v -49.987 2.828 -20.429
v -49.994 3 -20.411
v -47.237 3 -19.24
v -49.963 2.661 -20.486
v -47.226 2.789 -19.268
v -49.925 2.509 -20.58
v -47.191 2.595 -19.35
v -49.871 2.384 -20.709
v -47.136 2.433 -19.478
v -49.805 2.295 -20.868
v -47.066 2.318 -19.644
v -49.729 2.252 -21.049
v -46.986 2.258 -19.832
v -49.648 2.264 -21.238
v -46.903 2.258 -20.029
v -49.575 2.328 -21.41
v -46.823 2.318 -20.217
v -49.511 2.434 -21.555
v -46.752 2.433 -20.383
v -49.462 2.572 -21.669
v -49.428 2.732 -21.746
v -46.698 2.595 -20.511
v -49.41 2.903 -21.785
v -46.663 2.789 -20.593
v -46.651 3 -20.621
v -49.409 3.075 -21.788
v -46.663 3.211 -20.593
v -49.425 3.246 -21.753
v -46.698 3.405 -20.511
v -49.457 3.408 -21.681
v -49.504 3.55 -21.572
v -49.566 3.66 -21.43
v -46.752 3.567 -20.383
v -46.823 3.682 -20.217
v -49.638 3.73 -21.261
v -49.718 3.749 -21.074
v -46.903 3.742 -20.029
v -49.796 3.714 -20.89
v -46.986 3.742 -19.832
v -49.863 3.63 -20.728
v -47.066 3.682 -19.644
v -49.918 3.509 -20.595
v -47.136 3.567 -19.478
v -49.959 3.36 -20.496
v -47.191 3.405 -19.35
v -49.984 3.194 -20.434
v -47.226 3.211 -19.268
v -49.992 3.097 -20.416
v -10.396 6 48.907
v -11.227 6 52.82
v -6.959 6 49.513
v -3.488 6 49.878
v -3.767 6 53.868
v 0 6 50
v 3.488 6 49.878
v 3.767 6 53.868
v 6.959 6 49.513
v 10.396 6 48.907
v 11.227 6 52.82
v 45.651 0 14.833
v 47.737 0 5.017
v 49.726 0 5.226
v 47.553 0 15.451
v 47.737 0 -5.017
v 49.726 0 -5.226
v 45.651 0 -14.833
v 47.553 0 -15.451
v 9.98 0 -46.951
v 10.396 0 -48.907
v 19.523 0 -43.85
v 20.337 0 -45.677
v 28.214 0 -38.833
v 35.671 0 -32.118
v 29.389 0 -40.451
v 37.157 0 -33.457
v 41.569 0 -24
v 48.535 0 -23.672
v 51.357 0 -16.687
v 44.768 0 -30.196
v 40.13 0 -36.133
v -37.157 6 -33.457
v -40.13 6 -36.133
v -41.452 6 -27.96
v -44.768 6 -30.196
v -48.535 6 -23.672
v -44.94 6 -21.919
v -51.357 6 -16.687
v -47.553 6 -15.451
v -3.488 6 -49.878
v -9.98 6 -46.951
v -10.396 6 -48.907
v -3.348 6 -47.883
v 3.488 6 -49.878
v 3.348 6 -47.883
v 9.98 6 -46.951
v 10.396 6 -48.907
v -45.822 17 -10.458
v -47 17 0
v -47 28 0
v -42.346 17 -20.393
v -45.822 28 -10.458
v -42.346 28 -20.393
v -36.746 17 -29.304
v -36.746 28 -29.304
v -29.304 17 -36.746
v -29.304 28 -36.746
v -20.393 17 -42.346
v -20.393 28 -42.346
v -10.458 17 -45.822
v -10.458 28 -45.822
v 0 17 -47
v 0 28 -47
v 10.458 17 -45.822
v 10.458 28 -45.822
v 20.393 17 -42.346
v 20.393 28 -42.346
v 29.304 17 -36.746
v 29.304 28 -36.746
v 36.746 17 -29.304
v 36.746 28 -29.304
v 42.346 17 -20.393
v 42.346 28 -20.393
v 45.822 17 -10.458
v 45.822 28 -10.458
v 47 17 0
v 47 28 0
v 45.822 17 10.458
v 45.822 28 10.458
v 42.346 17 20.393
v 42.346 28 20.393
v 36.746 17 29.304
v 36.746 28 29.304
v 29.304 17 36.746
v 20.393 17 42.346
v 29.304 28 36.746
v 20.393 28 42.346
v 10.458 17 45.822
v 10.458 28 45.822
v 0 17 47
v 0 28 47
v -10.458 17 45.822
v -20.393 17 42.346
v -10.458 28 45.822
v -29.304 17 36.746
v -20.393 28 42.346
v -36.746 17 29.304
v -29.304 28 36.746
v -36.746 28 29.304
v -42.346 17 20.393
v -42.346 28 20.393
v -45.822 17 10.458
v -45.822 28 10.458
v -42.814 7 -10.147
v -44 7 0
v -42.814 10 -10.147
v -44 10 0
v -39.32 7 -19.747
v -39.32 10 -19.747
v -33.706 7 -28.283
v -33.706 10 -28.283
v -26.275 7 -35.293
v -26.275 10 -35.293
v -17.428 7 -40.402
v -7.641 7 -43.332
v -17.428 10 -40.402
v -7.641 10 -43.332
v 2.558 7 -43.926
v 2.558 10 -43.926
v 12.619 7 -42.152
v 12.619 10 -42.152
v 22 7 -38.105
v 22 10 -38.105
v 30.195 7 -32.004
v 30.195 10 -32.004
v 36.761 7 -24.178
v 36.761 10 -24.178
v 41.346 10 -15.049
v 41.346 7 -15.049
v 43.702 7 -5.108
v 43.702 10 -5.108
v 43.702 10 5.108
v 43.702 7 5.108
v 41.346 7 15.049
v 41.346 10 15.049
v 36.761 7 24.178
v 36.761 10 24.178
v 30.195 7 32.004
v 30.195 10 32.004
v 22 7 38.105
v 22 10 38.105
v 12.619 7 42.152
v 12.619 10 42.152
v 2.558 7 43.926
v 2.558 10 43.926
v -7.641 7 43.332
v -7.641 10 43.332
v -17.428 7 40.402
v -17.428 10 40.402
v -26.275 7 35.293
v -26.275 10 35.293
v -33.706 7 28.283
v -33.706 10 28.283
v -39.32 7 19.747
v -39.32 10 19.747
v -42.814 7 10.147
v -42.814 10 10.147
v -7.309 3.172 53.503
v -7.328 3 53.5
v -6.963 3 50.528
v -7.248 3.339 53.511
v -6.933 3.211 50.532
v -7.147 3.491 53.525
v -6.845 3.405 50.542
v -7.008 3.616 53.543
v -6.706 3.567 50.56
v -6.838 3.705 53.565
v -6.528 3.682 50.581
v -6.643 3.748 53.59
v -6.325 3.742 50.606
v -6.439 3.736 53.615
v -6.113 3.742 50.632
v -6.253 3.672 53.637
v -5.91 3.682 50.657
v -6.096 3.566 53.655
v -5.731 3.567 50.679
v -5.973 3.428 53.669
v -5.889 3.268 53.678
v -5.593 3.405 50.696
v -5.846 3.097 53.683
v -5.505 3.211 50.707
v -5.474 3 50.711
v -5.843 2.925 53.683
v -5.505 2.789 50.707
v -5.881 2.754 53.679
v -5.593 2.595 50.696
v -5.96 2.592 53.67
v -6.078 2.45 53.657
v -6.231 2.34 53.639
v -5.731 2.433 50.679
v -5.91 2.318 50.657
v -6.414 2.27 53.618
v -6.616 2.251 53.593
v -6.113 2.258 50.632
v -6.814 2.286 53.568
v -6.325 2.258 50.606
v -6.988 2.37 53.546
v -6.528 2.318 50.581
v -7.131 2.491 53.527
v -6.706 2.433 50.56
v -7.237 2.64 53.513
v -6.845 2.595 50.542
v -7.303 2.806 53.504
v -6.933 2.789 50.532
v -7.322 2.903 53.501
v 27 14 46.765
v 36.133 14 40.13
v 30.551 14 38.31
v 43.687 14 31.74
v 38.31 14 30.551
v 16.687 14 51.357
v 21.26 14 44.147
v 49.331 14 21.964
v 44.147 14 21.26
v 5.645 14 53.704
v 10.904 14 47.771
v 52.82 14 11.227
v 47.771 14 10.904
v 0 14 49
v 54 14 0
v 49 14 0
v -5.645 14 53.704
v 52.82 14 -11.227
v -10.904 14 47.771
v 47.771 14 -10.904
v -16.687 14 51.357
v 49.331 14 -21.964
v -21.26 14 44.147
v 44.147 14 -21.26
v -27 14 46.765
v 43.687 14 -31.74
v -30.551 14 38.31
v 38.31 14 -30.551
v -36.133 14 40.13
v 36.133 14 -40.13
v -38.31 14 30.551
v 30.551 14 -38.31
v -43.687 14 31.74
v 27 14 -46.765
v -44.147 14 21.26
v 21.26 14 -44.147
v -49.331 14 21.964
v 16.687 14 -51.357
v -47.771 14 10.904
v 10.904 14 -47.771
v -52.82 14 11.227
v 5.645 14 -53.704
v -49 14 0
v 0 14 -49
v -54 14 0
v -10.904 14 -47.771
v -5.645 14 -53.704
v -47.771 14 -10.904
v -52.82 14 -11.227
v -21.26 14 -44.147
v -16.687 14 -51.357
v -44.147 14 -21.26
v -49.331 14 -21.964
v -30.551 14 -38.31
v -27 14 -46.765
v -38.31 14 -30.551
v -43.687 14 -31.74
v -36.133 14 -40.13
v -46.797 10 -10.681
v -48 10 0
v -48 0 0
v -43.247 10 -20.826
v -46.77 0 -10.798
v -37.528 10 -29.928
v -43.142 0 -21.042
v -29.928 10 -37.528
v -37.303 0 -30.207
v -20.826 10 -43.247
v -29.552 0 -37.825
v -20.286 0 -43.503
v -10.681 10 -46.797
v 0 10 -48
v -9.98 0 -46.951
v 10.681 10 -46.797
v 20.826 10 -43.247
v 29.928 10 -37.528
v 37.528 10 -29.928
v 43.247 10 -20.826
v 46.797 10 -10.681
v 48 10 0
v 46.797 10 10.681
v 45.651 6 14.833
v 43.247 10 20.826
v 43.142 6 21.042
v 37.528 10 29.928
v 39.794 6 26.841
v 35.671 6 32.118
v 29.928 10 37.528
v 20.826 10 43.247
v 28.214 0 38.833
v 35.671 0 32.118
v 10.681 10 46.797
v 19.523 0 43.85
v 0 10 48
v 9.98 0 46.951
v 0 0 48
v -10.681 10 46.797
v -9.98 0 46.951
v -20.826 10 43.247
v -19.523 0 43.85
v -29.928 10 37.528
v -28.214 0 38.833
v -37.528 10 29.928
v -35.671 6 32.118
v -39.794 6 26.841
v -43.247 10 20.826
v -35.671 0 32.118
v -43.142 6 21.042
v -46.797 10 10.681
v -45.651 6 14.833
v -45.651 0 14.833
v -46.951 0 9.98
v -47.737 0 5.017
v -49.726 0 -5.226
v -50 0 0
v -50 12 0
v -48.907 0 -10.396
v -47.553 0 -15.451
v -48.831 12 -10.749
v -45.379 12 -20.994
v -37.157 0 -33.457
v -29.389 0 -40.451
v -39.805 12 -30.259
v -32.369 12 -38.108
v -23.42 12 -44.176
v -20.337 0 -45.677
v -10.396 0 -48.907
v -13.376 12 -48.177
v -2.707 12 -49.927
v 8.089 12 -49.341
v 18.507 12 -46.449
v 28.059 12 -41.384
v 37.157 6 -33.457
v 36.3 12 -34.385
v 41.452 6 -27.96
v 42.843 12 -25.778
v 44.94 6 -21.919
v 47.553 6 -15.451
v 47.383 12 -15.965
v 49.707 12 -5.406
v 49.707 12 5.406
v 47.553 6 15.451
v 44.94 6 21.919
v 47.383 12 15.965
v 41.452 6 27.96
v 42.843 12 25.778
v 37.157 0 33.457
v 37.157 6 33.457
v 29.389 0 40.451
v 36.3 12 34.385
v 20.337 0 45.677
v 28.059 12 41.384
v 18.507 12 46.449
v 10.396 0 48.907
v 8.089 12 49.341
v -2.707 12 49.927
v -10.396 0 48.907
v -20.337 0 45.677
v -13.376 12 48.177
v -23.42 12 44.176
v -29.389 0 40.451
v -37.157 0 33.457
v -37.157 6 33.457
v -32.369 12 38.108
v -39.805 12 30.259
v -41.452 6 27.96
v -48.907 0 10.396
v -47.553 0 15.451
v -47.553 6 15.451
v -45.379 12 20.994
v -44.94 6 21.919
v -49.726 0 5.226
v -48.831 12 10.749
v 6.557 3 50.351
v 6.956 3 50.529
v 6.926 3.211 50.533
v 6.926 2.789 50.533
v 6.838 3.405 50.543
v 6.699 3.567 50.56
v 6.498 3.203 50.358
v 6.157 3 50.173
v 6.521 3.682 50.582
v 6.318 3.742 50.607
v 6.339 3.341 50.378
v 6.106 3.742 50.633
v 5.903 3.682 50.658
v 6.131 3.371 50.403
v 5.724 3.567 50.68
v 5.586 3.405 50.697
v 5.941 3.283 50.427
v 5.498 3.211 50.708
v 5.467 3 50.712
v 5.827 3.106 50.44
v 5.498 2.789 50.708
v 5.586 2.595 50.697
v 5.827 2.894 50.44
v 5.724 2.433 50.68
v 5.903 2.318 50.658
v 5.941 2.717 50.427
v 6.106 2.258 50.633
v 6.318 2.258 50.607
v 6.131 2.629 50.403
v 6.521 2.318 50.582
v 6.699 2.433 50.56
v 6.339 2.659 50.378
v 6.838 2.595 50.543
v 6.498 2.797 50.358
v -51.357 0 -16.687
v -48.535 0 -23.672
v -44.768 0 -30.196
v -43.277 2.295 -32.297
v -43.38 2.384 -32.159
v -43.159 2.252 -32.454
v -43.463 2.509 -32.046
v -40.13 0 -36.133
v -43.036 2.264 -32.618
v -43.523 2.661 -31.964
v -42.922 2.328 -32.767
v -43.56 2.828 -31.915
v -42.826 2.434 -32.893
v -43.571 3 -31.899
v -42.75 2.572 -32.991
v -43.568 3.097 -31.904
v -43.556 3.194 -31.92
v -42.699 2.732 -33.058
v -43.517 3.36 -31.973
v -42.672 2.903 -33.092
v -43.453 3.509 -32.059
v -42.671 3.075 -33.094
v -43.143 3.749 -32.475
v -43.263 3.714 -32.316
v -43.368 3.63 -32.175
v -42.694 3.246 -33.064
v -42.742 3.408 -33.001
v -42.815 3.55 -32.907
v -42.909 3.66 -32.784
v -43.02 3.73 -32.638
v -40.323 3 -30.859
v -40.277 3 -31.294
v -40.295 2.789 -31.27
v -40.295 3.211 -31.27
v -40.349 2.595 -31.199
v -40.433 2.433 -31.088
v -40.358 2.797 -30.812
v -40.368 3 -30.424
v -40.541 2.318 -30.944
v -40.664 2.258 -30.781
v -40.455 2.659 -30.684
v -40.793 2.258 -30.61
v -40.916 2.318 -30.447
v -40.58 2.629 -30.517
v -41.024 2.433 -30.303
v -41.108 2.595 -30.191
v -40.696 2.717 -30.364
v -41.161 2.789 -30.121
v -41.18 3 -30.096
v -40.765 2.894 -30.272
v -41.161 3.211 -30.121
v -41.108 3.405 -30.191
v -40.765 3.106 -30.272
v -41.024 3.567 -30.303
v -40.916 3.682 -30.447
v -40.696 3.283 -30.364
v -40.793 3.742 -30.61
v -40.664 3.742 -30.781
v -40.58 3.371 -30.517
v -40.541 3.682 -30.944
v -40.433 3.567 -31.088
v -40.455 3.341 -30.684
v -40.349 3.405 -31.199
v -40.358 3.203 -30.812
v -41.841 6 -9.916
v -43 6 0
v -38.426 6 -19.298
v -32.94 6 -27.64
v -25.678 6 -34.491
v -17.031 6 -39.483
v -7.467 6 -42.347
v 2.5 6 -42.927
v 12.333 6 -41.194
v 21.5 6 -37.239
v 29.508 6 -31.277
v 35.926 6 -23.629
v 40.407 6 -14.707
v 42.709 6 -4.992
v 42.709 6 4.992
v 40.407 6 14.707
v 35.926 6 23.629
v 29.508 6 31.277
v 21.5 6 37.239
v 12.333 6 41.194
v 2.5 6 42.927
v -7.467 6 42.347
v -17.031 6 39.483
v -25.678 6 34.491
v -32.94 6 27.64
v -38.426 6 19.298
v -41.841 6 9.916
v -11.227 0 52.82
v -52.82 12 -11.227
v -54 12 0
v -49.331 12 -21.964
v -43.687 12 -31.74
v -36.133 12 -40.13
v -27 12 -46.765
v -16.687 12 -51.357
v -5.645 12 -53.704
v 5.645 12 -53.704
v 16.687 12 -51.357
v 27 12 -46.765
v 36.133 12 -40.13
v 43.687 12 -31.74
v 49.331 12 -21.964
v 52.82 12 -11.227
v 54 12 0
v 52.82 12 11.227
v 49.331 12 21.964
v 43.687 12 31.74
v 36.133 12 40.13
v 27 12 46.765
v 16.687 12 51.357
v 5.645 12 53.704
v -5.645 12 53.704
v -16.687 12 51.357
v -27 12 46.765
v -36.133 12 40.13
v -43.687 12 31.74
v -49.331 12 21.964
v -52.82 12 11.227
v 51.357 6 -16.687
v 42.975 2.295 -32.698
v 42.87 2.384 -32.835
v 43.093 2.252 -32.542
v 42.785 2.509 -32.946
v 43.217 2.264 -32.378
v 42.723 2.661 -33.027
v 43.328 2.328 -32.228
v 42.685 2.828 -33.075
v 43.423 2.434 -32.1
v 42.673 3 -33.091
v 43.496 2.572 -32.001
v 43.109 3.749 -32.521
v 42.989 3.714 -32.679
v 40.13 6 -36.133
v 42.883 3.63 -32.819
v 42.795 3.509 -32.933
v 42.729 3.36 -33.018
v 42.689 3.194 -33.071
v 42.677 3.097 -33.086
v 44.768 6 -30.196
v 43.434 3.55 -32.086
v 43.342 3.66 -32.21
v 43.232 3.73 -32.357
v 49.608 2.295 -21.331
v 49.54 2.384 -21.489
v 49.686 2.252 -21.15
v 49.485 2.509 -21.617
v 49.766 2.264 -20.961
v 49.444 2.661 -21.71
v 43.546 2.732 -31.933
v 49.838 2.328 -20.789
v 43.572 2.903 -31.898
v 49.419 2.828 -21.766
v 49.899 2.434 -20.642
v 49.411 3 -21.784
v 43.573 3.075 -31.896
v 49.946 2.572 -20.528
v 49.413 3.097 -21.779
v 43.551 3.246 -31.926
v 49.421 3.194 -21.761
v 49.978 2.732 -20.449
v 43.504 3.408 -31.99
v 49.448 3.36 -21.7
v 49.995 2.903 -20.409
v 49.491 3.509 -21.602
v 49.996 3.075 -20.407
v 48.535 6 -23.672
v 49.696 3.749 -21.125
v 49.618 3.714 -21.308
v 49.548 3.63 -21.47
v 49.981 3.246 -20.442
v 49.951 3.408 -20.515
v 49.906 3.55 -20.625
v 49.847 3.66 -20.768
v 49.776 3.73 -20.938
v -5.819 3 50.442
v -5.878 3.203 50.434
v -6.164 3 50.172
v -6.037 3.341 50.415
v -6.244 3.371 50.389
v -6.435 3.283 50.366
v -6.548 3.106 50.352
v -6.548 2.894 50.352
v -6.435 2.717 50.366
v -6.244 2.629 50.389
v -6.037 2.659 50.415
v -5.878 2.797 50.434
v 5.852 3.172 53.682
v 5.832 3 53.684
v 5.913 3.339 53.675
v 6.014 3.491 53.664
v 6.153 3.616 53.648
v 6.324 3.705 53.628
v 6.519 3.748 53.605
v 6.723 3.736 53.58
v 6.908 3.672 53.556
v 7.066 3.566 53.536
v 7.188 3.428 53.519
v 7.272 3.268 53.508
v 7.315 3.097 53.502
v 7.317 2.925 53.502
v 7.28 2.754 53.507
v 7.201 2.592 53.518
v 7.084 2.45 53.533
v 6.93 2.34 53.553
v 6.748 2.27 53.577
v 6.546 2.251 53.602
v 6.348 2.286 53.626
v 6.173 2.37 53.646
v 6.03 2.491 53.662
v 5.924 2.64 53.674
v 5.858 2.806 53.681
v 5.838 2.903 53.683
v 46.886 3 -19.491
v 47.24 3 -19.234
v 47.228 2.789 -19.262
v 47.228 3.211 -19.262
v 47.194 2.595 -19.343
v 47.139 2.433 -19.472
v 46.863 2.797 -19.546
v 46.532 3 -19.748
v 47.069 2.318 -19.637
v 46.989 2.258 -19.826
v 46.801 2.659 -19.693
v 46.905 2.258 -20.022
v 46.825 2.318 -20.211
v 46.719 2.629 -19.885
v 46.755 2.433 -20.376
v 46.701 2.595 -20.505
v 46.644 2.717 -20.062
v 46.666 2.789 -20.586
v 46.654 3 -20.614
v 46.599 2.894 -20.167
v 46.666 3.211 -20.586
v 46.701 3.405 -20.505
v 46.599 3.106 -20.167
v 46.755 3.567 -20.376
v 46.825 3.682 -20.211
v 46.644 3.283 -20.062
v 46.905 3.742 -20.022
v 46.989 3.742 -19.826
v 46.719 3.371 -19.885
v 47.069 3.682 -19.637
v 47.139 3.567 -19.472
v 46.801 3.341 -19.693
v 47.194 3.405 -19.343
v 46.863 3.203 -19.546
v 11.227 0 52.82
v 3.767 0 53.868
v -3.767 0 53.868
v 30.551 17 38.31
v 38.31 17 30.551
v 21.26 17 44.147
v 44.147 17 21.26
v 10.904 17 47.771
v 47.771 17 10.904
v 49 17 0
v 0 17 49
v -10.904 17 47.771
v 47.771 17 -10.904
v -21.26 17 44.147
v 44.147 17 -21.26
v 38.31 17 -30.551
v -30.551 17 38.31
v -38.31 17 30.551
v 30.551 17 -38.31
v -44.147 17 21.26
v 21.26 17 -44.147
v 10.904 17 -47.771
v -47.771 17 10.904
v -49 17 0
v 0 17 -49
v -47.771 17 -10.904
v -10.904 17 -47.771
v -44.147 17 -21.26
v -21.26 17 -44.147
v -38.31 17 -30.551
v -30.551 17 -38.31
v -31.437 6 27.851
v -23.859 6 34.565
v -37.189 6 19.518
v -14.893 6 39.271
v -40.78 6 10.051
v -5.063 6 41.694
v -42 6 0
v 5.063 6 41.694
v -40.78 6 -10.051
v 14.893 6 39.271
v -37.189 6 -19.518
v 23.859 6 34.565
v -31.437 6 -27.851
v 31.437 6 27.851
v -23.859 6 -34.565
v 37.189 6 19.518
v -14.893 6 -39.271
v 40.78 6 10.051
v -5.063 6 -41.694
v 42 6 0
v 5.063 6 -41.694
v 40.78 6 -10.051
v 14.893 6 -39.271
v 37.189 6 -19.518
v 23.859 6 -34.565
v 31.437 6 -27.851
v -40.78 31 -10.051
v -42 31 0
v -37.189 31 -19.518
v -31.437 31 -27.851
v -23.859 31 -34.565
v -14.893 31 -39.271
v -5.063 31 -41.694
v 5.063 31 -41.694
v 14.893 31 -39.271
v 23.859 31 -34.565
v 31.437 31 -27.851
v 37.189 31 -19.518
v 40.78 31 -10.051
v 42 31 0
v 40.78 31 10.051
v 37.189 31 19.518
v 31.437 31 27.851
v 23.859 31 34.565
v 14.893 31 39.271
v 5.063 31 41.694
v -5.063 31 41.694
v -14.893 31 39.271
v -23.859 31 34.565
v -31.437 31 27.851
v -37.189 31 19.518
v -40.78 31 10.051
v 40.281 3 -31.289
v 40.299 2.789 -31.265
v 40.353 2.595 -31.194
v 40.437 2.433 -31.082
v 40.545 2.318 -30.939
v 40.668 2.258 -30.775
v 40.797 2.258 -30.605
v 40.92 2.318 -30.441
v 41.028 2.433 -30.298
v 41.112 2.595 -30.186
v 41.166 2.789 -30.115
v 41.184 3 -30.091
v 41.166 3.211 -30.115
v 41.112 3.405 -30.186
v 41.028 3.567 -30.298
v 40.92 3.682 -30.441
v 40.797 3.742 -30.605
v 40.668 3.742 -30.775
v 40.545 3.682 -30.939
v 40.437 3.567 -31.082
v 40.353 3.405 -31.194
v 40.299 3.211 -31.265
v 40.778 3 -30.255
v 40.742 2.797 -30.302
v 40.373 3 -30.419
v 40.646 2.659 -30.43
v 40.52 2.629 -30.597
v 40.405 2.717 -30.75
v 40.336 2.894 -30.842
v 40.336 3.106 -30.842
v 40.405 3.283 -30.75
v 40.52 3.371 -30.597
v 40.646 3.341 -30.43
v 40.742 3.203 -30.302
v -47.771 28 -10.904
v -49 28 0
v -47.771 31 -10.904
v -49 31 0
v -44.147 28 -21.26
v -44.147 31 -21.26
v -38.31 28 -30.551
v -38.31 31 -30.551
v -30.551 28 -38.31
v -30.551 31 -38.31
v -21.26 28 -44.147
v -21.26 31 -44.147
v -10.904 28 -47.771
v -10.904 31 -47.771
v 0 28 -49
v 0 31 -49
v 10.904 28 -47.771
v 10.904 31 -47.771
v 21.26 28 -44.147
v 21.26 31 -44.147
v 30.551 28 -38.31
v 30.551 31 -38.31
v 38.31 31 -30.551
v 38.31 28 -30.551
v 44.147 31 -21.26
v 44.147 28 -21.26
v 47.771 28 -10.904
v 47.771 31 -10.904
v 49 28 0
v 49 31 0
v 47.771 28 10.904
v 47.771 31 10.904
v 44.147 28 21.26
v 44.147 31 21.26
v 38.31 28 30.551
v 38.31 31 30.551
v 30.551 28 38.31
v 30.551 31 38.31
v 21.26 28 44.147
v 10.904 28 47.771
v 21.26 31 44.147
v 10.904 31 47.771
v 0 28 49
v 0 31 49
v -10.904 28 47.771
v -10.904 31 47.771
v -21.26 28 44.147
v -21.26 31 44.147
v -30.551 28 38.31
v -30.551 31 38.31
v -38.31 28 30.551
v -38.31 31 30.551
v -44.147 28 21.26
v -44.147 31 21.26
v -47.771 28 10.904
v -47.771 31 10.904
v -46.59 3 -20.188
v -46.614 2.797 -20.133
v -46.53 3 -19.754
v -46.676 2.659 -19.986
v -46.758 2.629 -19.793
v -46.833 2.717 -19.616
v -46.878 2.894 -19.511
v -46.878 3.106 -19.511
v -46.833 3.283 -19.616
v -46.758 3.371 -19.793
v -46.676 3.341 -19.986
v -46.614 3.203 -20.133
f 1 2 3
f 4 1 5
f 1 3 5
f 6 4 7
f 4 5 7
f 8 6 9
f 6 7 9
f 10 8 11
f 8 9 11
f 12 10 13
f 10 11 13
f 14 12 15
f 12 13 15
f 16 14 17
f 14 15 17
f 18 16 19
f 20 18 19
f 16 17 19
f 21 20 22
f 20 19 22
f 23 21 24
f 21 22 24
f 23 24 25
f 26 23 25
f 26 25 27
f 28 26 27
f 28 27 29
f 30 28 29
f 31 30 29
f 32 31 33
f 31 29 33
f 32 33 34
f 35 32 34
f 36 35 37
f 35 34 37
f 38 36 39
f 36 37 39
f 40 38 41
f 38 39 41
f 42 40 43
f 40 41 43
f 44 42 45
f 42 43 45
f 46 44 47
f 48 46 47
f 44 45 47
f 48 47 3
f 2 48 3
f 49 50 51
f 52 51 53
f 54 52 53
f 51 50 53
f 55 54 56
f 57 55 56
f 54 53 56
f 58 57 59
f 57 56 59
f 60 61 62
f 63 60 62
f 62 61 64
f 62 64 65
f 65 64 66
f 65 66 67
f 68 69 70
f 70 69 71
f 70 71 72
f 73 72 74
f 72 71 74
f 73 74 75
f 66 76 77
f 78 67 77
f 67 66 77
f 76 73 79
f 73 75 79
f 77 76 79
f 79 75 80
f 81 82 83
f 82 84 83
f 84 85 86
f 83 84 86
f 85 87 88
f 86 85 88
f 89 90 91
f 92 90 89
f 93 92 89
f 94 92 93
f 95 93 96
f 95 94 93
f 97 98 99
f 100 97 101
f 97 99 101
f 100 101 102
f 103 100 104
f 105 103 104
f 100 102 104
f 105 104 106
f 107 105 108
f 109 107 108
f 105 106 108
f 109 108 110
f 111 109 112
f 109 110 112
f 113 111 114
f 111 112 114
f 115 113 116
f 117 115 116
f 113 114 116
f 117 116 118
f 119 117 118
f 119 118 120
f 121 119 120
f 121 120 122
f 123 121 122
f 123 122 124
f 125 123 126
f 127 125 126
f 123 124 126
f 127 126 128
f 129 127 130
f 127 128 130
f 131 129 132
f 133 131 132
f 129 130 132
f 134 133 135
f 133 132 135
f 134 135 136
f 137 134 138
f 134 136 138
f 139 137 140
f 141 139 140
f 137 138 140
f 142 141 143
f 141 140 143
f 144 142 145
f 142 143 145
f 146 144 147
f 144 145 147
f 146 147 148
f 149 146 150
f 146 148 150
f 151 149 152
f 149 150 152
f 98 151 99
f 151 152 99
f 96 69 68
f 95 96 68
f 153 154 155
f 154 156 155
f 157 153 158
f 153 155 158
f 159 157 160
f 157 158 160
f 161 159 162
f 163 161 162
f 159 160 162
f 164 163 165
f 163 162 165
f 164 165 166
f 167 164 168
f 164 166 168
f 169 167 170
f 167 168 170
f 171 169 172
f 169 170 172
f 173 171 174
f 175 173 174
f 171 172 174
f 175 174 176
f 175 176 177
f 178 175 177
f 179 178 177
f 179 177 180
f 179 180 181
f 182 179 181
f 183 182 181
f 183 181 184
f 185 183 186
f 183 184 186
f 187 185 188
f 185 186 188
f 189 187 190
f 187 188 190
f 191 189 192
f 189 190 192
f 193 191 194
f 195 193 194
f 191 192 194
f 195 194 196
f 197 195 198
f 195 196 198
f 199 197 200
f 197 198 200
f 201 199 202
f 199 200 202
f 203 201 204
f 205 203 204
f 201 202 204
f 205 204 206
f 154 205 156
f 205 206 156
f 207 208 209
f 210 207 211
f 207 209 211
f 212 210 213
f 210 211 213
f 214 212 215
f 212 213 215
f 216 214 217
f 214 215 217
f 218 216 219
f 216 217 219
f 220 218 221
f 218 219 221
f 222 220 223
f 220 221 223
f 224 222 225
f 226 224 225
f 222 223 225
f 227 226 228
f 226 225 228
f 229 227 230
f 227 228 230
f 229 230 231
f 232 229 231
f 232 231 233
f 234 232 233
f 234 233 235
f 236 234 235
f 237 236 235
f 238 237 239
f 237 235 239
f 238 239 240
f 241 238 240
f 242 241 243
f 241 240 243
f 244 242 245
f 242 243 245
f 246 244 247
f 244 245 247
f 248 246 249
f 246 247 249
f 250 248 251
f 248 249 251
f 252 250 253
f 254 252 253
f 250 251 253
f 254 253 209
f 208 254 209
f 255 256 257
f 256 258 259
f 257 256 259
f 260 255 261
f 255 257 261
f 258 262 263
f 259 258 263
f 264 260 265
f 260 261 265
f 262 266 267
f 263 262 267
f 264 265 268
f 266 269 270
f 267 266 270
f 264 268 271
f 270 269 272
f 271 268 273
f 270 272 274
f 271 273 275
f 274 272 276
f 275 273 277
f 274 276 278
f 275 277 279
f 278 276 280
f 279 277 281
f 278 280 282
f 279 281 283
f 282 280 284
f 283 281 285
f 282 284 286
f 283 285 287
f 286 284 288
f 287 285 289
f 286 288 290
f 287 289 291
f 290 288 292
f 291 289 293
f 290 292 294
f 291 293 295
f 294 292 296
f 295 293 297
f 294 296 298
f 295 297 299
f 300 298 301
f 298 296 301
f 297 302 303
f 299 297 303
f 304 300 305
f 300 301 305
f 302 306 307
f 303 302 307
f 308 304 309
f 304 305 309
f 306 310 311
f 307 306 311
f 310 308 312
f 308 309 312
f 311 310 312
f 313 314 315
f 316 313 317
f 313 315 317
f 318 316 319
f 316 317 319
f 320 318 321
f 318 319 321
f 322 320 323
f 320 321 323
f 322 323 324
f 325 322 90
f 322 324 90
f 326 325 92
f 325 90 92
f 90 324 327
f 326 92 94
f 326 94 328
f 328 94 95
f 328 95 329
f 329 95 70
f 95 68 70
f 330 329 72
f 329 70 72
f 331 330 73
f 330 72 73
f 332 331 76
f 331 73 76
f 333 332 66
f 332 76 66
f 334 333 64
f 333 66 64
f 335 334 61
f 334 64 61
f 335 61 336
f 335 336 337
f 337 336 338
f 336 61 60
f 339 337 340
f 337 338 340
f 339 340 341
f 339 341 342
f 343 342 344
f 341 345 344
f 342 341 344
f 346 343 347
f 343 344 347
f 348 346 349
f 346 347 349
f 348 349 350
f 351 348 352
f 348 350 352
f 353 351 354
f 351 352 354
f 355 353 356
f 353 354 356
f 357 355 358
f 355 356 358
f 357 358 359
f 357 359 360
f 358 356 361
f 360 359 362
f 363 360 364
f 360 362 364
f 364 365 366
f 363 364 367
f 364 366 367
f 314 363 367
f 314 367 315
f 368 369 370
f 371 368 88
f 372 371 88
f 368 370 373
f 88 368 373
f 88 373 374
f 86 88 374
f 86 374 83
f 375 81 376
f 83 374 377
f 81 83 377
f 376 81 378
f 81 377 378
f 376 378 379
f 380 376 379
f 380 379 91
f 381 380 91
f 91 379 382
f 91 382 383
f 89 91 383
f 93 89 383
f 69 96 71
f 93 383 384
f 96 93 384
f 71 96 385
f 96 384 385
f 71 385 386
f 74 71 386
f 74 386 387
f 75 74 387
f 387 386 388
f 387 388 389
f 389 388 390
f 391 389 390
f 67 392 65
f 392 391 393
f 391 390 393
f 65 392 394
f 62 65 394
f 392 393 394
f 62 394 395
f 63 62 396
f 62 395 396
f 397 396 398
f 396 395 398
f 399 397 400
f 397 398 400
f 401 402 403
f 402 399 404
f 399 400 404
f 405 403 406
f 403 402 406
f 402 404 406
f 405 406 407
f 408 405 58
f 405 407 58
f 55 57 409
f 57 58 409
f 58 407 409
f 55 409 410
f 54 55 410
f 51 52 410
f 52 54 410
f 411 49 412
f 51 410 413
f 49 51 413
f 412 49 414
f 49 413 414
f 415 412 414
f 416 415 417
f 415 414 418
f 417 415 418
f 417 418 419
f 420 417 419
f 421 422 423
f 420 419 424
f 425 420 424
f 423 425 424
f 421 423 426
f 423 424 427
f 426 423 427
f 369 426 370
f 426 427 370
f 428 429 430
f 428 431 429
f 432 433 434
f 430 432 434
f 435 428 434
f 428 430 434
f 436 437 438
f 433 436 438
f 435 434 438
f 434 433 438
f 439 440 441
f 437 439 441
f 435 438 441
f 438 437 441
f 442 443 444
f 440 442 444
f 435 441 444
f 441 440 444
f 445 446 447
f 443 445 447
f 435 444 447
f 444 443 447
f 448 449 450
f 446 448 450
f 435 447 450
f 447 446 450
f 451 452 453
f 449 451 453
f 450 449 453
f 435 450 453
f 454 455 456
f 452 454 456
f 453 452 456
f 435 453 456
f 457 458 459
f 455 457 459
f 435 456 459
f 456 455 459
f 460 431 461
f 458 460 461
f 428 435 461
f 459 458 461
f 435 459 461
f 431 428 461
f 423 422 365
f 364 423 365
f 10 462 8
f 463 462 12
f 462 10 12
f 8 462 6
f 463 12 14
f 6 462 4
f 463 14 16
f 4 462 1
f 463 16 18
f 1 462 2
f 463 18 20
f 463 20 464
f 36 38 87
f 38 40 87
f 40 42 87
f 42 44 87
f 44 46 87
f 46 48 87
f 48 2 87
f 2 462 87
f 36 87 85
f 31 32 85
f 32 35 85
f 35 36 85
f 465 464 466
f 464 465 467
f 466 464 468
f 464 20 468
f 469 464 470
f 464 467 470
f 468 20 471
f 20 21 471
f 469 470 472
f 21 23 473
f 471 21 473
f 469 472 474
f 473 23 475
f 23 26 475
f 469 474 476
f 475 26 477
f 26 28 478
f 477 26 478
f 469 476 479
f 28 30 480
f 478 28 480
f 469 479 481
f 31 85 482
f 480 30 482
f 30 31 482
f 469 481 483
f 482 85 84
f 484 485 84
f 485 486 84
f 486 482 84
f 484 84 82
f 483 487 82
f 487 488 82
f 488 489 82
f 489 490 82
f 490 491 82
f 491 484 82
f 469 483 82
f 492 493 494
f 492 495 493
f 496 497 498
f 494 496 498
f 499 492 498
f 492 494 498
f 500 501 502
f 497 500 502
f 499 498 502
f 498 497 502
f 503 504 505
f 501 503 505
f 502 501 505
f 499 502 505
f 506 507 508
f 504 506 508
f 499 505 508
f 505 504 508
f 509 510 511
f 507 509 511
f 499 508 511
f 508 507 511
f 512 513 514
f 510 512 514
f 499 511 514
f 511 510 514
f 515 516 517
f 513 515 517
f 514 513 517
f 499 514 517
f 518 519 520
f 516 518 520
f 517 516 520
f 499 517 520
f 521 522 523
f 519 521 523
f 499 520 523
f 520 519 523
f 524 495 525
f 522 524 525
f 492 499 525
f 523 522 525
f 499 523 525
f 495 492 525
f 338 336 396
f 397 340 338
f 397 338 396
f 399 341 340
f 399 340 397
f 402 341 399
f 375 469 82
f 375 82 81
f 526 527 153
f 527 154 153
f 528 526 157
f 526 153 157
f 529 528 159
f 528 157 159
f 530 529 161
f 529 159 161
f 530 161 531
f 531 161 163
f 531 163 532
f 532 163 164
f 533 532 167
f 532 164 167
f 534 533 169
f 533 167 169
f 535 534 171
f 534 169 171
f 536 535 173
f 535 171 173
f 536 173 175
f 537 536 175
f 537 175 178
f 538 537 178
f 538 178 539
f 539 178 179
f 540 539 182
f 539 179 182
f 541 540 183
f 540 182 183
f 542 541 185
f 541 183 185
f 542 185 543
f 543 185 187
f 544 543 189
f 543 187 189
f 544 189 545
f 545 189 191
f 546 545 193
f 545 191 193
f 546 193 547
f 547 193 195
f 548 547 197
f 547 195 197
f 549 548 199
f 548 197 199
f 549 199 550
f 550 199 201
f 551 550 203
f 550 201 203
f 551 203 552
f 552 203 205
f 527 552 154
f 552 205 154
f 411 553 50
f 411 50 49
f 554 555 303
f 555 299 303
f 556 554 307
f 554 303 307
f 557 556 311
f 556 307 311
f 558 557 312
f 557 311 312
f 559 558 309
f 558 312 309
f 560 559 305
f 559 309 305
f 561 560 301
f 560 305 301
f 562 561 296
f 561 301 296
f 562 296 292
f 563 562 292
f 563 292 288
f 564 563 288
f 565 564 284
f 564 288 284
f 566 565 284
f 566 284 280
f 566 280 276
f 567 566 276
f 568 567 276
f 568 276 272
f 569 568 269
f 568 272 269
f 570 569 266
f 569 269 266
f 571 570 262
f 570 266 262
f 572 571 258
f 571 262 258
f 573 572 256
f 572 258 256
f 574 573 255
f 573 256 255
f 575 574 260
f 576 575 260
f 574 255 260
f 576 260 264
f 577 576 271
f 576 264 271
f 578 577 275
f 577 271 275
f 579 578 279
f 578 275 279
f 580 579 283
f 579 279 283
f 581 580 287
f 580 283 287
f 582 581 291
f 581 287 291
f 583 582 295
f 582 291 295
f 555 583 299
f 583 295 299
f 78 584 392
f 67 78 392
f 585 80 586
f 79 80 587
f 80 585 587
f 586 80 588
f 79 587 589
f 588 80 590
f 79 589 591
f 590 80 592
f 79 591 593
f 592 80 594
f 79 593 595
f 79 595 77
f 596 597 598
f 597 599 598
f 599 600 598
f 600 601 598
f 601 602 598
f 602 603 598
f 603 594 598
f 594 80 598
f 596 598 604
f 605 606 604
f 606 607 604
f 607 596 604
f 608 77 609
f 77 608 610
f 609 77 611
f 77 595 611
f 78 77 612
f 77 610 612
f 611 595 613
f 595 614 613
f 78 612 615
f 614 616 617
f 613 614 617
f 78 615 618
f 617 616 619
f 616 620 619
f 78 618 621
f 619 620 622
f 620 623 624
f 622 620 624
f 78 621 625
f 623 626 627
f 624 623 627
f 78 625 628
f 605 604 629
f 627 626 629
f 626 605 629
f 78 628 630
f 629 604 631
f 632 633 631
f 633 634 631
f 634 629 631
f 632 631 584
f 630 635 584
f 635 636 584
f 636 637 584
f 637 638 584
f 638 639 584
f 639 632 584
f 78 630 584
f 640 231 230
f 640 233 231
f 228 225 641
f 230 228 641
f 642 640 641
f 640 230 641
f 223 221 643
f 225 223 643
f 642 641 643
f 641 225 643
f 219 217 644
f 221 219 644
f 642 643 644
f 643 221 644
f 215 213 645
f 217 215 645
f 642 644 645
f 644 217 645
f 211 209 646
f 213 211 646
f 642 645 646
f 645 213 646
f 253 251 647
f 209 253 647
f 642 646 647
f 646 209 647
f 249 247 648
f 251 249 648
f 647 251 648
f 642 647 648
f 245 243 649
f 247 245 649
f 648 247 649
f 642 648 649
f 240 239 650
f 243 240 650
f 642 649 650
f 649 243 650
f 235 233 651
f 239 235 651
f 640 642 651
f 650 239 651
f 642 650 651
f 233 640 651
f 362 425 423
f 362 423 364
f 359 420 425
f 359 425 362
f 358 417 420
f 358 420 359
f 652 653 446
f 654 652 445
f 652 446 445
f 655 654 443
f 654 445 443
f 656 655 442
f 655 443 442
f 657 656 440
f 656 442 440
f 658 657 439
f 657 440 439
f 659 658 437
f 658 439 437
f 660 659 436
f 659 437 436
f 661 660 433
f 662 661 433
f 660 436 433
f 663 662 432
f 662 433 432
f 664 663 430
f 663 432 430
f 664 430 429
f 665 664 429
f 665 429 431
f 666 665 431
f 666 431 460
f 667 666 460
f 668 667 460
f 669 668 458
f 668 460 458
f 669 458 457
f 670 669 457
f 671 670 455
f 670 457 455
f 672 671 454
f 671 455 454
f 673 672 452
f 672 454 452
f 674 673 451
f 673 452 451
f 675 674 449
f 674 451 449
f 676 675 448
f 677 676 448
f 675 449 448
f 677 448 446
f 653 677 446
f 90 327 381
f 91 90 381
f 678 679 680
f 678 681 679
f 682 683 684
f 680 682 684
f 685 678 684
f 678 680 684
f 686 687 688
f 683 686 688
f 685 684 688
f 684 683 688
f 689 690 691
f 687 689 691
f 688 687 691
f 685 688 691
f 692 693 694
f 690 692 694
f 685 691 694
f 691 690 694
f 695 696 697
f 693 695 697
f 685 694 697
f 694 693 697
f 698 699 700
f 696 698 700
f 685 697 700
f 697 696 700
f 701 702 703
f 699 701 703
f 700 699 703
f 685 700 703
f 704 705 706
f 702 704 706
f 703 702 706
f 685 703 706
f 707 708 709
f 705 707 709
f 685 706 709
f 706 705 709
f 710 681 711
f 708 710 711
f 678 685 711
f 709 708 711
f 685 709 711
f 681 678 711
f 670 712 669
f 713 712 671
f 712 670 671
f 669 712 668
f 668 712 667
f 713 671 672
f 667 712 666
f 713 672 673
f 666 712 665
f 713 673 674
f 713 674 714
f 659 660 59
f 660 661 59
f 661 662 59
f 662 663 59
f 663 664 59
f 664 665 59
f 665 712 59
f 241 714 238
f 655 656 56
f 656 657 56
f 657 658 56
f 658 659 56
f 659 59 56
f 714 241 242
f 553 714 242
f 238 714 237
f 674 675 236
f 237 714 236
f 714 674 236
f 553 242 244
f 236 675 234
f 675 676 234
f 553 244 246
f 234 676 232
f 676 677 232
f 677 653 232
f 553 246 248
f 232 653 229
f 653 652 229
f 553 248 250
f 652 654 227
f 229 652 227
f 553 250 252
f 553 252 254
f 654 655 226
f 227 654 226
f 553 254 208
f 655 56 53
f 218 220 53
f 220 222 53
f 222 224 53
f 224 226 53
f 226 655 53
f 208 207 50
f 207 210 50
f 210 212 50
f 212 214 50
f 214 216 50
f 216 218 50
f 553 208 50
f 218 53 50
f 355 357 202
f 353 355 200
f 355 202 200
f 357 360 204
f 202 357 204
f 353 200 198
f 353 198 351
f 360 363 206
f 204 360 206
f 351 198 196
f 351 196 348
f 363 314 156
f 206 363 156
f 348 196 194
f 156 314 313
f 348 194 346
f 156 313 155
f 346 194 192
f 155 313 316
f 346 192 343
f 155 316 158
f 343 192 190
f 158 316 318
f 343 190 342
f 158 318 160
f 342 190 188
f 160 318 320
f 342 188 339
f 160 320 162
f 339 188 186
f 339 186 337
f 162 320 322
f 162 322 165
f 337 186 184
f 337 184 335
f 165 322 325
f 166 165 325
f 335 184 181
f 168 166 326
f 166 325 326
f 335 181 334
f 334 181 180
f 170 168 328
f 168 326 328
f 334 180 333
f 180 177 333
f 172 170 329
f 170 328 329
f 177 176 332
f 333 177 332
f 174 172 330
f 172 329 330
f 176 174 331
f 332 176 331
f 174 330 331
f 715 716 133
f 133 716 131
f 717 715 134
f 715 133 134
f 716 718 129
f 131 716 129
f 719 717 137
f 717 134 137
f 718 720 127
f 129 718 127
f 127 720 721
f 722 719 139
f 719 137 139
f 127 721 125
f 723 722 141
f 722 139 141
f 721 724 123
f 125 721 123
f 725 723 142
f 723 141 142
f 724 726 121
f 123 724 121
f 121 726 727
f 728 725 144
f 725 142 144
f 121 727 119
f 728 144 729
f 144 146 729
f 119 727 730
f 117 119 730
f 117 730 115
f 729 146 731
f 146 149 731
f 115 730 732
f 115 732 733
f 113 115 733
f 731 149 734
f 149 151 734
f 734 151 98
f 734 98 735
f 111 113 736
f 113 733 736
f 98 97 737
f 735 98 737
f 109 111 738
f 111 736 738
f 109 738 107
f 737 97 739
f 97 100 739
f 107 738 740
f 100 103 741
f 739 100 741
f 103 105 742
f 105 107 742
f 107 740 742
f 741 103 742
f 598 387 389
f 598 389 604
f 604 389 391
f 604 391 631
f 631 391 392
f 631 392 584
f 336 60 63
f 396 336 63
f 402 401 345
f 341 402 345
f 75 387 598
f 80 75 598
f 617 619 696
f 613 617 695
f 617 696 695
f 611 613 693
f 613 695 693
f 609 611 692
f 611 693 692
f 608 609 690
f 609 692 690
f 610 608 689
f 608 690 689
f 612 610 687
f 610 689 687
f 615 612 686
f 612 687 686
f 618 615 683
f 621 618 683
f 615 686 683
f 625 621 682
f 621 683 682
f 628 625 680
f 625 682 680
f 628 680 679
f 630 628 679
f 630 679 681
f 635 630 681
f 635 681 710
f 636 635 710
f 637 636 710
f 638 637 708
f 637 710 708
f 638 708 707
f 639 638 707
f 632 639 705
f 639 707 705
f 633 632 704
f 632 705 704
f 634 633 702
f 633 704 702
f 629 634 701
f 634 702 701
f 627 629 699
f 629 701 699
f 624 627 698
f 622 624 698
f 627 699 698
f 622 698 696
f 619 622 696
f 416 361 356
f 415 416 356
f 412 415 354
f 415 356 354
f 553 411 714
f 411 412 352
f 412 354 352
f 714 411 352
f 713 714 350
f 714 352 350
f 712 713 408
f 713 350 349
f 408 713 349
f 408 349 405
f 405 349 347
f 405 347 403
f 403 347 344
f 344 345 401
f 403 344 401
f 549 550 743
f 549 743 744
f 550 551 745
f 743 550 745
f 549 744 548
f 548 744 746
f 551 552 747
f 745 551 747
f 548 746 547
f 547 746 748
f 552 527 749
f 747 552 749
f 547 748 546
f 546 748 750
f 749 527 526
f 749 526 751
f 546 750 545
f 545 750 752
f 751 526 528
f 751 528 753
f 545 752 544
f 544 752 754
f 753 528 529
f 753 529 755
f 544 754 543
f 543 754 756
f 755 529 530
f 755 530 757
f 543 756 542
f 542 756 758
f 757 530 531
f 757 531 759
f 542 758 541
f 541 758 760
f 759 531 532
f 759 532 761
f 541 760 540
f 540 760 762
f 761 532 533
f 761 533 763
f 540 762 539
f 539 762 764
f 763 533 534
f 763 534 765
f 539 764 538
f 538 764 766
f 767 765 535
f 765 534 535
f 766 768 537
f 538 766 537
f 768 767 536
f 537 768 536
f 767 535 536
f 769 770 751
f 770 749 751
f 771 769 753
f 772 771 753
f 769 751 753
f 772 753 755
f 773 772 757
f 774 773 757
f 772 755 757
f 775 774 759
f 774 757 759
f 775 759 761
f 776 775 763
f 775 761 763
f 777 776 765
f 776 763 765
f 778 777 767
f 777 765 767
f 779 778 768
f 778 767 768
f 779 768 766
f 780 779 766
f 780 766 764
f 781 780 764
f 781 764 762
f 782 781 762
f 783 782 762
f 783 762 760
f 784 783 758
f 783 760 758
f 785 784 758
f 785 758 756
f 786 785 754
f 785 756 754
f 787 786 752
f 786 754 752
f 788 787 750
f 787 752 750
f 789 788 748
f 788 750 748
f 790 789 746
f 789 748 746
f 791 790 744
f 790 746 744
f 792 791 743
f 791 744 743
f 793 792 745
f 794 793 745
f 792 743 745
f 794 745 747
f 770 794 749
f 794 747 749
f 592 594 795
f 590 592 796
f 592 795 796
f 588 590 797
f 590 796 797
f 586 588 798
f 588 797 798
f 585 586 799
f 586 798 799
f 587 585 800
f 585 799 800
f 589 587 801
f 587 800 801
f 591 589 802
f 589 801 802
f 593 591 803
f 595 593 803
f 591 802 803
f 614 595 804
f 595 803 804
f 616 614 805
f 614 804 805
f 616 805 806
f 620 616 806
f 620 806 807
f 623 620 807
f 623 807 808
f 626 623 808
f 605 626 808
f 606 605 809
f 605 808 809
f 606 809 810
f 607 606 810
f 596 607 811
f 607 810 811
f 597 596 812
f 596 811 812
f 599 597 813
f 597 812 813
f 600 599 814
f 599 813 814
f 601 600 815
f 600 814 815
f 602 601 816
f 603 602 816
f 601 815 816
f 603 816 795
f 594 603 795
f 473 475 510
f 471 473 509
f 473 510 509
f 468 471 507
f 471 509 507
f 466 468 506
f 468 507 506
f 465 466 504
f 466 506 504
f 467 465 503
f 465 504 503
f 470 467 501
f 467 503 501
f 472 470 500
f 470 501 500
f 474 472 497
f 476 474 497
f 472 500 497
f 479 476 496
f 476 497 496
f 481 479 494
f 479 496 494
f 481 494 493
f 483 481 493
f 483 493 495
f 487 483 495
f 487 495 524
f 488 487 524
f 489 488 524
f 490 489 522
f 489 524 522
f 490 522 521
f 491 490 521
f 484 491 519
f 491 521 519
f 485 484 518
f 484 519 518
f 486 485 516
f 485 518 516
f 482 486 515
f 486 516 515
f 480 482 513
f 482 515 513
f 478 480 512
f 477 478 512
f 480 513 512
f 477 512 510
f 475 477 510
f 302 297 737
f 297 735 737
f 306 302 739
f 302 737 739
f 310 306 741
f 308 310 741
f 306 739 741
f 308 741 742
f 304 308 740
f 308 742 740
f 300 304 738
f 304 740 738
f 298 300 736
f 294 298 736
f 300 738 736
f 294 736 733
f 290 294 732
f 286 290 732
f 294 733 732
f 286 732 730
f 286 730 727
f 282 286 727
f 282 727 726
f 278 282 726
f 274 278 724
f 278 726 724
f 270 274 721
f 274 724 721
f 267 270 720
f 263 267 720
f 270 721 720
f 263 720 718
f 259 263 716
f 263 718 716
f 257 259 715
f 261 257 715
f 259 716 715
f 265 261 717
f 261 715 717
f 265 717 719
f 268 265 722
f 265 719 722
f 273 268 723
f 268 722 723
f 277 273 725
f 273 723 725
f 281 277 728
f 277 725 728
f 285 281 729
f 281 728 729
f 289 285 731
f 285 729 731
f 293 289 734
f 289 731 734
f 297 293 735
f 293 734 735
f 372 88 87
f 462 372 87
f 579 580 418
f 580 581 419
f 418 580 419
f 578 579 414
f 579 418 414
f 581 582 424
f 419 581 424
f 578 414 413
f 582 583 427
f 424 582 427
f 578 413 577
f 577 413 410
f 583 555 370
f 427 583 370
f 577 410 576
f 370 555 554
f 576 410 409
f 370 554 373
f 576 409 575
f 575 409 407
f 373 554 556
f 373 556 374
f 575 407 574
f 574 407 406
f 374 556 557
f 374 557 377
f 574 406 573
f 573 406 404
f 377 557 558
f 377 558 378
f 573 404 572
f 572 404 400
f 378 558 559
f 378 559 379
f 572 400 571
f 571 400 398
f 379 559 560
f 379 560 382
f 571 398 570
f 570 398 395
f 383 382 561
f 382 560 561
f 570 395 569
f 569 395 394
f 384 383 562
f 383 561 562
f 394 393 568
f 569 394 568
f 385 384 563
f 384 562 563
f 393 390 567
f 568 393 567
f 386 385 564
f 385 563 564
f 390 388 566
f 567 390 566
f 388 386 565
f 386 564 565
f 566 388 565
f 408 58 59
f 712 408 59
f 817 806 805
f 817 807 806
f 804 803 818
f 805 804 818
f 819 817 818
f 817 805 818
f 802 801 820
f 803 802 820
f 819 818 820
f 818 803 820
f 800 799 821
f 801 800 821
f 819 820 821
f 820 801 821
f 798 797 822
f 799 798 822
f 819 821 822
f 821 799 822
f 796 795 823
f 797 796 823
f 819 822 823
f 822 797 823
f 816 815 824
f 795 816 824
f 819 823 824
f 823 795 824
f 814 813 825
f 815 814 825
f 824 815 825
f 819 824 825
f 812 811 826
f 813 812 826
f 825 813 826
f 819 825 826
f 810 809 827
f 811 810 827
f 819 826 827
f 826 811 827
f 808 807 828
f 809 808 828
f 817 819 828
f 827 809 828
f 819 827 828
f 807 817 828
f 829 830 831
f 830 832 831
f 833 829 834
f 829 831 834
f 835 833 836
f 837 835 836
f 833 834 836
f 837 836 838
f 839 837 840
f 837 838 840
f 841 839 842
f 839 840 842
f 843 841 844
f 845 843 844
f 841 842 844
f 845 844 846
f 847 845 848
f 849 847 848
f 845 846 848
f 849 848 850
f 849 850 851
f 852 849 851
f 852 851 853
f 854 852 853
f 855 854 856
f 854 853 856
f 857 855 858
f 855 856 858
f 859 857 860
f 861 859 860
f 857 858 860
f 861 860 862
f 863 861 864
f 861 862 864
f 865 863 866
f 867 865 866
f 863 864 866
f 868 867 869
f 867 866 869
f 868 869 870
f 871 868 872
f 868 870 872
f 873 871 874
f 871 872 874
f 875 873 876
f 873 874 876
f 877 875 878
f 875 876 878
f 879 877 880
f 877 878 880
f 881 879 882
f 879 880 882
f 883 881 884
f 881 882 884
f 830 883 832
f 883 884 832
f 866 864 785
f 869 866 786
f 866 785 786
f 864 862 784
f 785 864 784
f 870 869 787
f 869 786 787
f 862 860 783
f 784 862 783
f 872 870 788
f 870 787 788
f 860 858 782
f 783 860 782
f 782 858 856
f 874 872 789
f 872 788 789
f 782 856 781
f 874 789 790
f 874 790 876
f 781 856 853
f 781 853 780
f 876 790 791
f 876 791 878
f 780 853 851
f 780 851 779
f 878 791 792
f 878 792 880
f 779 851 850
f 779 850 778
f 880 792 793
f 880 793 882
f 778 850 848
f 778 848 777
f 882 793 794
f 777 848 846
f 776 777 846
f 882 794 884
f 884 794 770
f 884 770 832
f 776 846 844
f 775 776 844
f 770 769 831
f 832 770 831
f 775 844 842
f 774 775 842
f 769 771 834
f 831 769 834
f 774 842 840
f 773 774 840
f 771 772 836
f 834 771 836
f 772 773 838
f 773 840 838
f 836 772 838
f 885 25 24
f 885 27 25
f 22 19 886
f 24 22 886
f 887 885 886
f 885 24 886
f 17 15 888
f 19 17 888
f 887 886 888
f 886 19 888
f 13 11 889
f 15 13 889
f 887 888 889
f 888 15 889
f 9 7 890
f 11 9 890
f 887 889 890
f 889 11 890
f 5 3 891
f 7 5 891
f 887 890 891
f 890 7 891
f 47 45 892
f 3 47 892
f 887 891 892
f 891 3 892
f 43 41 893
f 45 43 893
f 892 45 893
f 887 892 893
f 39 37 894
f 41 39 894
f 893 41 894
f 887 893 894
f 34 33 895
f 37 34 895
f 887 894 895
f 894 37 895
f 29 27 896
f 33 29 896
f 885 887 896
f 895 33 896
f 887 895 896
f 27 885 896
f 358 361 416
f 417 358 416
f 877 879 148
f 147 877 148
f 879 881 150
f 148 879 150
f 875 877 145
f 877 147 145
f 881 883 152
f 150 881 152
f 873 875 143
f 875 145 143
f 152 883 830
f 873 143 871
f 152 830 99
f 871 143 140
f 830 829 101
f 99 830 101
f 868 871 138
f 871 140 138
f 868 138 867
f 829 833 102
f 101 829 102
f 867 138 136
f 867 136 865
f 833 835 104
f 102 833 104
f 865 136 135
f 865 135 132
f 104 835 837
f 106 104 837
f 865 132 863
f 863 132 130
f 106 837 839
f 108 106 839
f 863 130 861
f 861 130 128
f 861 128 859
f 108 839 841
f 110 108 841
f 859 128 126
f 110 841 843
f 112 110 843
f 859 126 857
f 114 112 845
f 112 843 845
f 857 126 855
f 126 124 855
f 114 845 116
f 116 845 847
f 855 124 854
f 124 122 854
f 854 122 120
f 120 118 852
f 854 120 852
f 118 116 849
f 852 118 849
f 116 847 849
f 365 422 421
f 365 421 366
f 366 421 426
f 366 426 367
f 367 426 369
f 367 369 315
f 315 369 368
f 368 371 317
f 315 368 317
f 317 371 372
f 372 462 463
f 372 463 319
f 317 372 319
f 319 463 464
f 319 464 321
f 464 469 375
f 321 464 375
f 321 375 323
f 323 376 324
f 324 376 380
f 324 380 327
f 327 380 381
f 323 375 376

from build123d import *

# Parameters (mm, degrees)
CUT_EXTRUDE1_DEPTH                  = 6
CUT_EXTRUDE2_DEPTH                  = 6
CUT_EXTRUDE3_DEPTH                  = 6
BOSS_EXTRUDE1_DEPTH                 = 6
BOSS_EXTRUDE2_DEPTH                 = 6
BOSS_EXTRUDE3_DEPTH                 = 6
F_1_5MM_DOWEL_HOLE1_D               = 1.5
F_1_5MM_DOWEL_HOLE1_DEPTH           = 3
F_1_5MM_DOWEL_HOLE1_TIP             = 0.450645464
F_1_5MM_DOWEL_HOLE1_ON_FACE_2_D     = 1.5
F_1_5MM_DOWEL_HOLE1_ON_FACE_2_DEPTH = 3
F_1_5MM_DOWEL_HOLE1_ON_FACE_2_TIP   = 0.450645464
F_1_5MM_DOWEL_HOLE1_ON_FACE_3_D     = 1.5
F_1_5MM_DOWEL_HOLE1_ON_FACE_3_DEPTH = 3
F_1_5MM_DOWEL_HOLE1_ON_FACE_3_TIP   = 0.450645464
F_1_5MM_DOWEL_HOLE1_ON_FACE_4_D     = 1.5
F_1_5MM_DOWEL_HOLE1_ON_FACE_4_DEPTH = 3
F_1_5MM_DOWEL_HOLE1_ON_FACE_4_TIP   = 0.450645464
F_1_5MM_DOWEL_HOLE1_ON_FACE_5_D     = 1.5
F_1_5MM_DOWEL_HOLE1_ON_FACE_5_DEPTH = 3
F_1_5MM_DOWEL_HOLE1_ON_FACE_5_TIP   = 0.450645464
F_1_5MM_DOWEL_HOLE1_ON_FACE_6_D     = 1.5
F_1_5MM_DOWEL_HOLE1_ON_FACE_6_DEPTH = 3
F_1_5MM_DOWEL_HOLE1_ON_FACE_6_TIP   = 0.450645464


with BuildPart() as part:
    # Sketch1 → Revolve1 (revolve)
    with BuildSketch(Plane.XY):
        Polygon((-42, 6), (-42, 31), (-49, 31), (-49, 28), (-47, 28), (-47, 17), (-49, 17), (-49, 14), (-54, 14), (-54, 12), (-50, 12), (-50, 0), (-48, 0), (-48, 10), (-44, 10), (-44, 7), (-43, 6), align=None)
    revolve(axis=Axis((0, 15.855614973, 0), (0, -1, 0)))

    # Sketch2 → Cut-Extrude1 (cut)
    with BuildSketch(Plane.XZ):
        with BuildLine():
            Line((10.395584541, -48.907380037), (9.979761159, -46.951084835))
            ThreePointArc((9.979761159, -46.951084835), (0, -48), (-9.979761159, -46.951084835))
            Line((-9.979761159, -46.951084835), (-10.395584541, -48.907380037))
            ThreePointArc((-10.395584541, -48.907380037), (0, -50), (10.395584541, -48.907380037))
        make_face()
    extrude(amount=-CUT_EXTRUDE1_DEPTH, mode=Mode.SUBTRACT)

    # Sketch2<5> → Cut-Extrude2 (cut)
    with BuildSketch(Plane.XZ):
        with BuildLine():
            ThreePointArc((-45.650712782, 14.83281573), (-41.569219382, 24), (-35.670951623, 32.118269105))
            Line((-35.670951623, 32.118269105), (-37.157241274, 33.456530318))
            ThreePointArc((-37.157241274, 33.456530318), (-43.301270189, 25), (-47.552825815, 15.450849719))
            Line((-47.552825815, 15.450849719), (-45.650712782, 14.83281573))
        make_face()
    extrude(amount=-CUT_EXTRUDE2_DEPTH, mode=Mode.SUBTRACT)

    # Sketch2<6> → Cut-Extrude3 (cut)
    with BuildSketch(Plane.XZ):
        with BuildLine():
            Line((37.157241274, 33.456530318), (35.670951623, 32.118269105))
            ThreePointArc((35.670951623, 32.118269105), (41.569219382, 24), (45.650712782, 14.83281573))
            Line((45.650712782, 14.83281573), (47.552825815, 15.450849719))
            ThreePointArc((47.552825815, 15.450849719), (43.301270189, 25), (37.157241274, 33.456530318))
        make_face()
    extrude(amount=-CUT_EXTRUDE3_DEPTH, mode=Mode.SUBTRACT)

    # Sketch2<7> → Boss-Extrude1 (add)
    with BuildSketch(Plane.XZ):
        with BuildLine():
            ThreePointArc((47.552825815, -15.450849719), (43.301270189, -25), (37.157241274, -33.456530318))
            Line((37.157241274, -33.456530318), (40.129820576, -36.133052743))
            ThreePointArc((40.129820576, -36.133052743), (46.765371804, -27), (51.35705188, -16.686917696))
            Line((51.35705188, -16.686917696), (47.552825815, -15.450849719))
        make_face()
    extrude(amount=-BOSS_EXTRUDE1_DEPTH)

    # Sketch2<8> → Boss-Extrude2 (add)
    with BuildSketch(Plane.XZ):
        with BuildLine():
            ThreePointArc((-10.395584541, 48.907380037), (-5.226423163, 49.726094768), (0, 50))
            ThreePointArc((0, 50), (5.226423163, 49.726094768), (10.395584541, 48.907380037))
            Line((10.395584541, 48.907380037), (11.227231304, 52.81997044))
            ThreePointArc((11.227231304, 52.81997044), (0, 54), (-11.227231304, 52.81997044))
            Line((-11.227231304, 52.81997044), (-10.395584541, 48.907380037))
        make_face()
    extrude(amount=-BOSS_EXTRUDE2_DEPTH)

    # Sketch2<9> → Boss-Extrude3 (add)
    with BuildSketch(Plane.XZ):
        with BuildLine():
            Line((-40.129820576, -36.133052743), (-37.157241274, -33.456530318))
            ThreePointArc((-37.157241274, -33.456530318), (-43.301270189, -25), (-47.552825815, -15.450849719))
            Line((-47.552825815, -15.450849719), (-51.35705188, -16.686917696))
            ThreePointArc((-51.35705188, -16.686917696), (-46.765371804, -27), (-40.129820576, -36.133052743))
        make_face()
    extrude(amount=-BOSS_EXTRUDE3_DEPTH)

    # Ø1.5mm Dowel Hole1
    with Locations(Plane(origin=(6.577263108, 3, 53.597944084), x_dir=(0.992554520069, 0, -0.121801168675), z_dir=(0.121801168675, 0, 0.992554520069))):
        with Locations((0, 0)):
            Hole(F_1_5MM_DOWEL_HOLE1_D / 2, depth=F_1_5MM_DOWEL_HOLE1_DEPTH)
            with Locations((0, 0, -(F_1_5MM_DOWEL_HOLE1_DEPTH + F_1_5MM_DOWEL_HOLE1_TIP / 2))):  # 118° drill point
                Cone(0, F_1_5MM_DOWEL_HOLE1_D / 2, F_1_5MM_DOWEL_HOLE1_TIP, mode=Mode.SUBTRACT)

    # Ø1.5mm Dowel Hole1 on face 2
    with Locations(Plane(origin=(-6.584625948, 3, 53.597040041), x_dir=(0.992537723435, 0, 0.121937966023), z_dir=(-0.121937966023, 0, 0.992537723435))):
        with Locations((0, 0)):
            Hole(F_1_5MM_DOWEL_HOLE1_ON_FACE_2_D / 2, depth=F_1_5MM_DOWEL_HOLE1_ON_FACE_2_DEPTH)
            with Locations((0, 0, -(F_1_5MM_DOWEL_HOLE1_ON_FACE_2_DEPTH + F_1_5MM_DOWEL_HOLE1_ON_FACE_2_TIP / 2))):  # 118° drill point
                Cone(0, F_1_5MM_DOWEL_HOLE1_ON_FACE_2_D / 2, F_1_5MM_DOWEL_HOLE1_ON_FACE_2_TIP, mode=Mode.SUBTRACT)

    # Ø1.5mm Dowel Hole1 on face 3
    with Locations(Plane(origin=(-49.705812721, 3, -21.102895103), x_dir=(0.39079405883, 0, -0.920478138569), z_dir=(-0.920478138569, 0, -0.39079405883))):
        with Locations((-1e-09, 0)):
            Hole(F_1_5MM_DOWEL_HOLE1_ON_FACE_3_D / 2, depth=F_1_5MM_DOWEL_HOLE1_ON_FACE_3_DEPTH)
            with Locations((0, 0, -(F_1_5MM_DOWEL_HOLE1_ON_FACE_3_DEPTH + F_1_5MM_DOWEL_HOLE1_ON_FACE_3_TIP / 2))):  # 118° drill point
                Cone(0, F_1_5MM_DOWEL_HOLE1_ON_FACE_3_D / 2, F_1_5MM_DOWEL_HOLE1_ON_FACE_3_TIP, mode=Mode.SUBTRACT)

    # Ø1.5mm Dowel Hole1 on face 4
    with Locations(Plane(origin=(-43.124085269, 3, -32.500973366), x_dir=(0.601870037997, 0, -0.798594050417), z_dir=(-0.798594050417, 0, -0.601870037997))):
        with Locations((0, 0)):
            Hole(F_1_5MM_DOWEL_HOLE1_ON_FACE_4_D / 2, depth=F_1_5MM_DOWEL_HOLE1_ON_FACE_4_DEPTH)
            with Locations((0, 0, -(F_1_5MM_DOWEL_HOLE1_ON_FACE_4_DEPTH + F_1_5MM_DOWEL_HOLE1_ON_FACE_4_TIP / 2))):  # 118° drill point
                Cone(0, F_1_5MM_DOWEL_HOLE1_ON_FACE_4_D / 2, F_1_5MM_DOWEL_HOLE1_ON_FACE_4_TIP, mode=Mode.SUBTRACT)

    # Ø1.5mm Dowel Hole1 on face 5
    with Locations(Plane(origin=(43.128549613, 3, -32.495048981), x_dir=(0.601759985579, 0, 0.79867698086), z_dir=(0.79867698086, 0, -0.601759985579))):
        with Locations((0, 0)):
            Hole(F_1_5MM_DOWEL_HOLE1_ON_FACE_5_D / 2, depth=F_1_5MM_DOWEL_HOLE1_ON_FACE_5_DEPTH)
            with Locations((0, 0, -(F_1_5MM_DOWEL_HOLE1_ON_FACE_5_DEPTH + F_1_5MM_DOWEL_HOLE1_ON_FACE_5_TIP / 2))):  # 118° drill point
                Cone(0, F_1_5MM_DOWEL_HOLE1_ON_FACE_5_D / 2, F_1_5MM_DOWEL_HOLE1_ON_FACE_5_TIP, mode=Mode.SUBTRACT)

    # Ø1.5mm Dowel Hole1 on face 6
    with Locations(Plane(origin=(49.708711217, 3, -21.096066675), x_dir=(0.39066787318, 0, 0.920531701173), z_dir=(0.920531701173, 0, -0.39066787318))):
        with Locations((0, 0)):
            Hole(F_1_5MM_DOWEL_HOLE1_ON_FACE_6_D / 2, depth=F_1_5MM_DOWEL_HOLE1_ON_FACE_6_DEPTH)
            with Locations((0, 0, -(F_1_5MM_DOWEL_HOLE1_ON_FACE_6_DEPTH + F_1_5MM_DOWEL_HOLE1_ON_FACE_6_TIP / 2))):  # 118° drill point
                Cone(0, F_1_5MM_DOWEL_HOLE1_ON_FACE_6_D / 2, F_1_5MM_DOWEL_HOLE1_ON_FACE_6_TIP, mode=Mode.SUBTRACT)


solid = part.part
